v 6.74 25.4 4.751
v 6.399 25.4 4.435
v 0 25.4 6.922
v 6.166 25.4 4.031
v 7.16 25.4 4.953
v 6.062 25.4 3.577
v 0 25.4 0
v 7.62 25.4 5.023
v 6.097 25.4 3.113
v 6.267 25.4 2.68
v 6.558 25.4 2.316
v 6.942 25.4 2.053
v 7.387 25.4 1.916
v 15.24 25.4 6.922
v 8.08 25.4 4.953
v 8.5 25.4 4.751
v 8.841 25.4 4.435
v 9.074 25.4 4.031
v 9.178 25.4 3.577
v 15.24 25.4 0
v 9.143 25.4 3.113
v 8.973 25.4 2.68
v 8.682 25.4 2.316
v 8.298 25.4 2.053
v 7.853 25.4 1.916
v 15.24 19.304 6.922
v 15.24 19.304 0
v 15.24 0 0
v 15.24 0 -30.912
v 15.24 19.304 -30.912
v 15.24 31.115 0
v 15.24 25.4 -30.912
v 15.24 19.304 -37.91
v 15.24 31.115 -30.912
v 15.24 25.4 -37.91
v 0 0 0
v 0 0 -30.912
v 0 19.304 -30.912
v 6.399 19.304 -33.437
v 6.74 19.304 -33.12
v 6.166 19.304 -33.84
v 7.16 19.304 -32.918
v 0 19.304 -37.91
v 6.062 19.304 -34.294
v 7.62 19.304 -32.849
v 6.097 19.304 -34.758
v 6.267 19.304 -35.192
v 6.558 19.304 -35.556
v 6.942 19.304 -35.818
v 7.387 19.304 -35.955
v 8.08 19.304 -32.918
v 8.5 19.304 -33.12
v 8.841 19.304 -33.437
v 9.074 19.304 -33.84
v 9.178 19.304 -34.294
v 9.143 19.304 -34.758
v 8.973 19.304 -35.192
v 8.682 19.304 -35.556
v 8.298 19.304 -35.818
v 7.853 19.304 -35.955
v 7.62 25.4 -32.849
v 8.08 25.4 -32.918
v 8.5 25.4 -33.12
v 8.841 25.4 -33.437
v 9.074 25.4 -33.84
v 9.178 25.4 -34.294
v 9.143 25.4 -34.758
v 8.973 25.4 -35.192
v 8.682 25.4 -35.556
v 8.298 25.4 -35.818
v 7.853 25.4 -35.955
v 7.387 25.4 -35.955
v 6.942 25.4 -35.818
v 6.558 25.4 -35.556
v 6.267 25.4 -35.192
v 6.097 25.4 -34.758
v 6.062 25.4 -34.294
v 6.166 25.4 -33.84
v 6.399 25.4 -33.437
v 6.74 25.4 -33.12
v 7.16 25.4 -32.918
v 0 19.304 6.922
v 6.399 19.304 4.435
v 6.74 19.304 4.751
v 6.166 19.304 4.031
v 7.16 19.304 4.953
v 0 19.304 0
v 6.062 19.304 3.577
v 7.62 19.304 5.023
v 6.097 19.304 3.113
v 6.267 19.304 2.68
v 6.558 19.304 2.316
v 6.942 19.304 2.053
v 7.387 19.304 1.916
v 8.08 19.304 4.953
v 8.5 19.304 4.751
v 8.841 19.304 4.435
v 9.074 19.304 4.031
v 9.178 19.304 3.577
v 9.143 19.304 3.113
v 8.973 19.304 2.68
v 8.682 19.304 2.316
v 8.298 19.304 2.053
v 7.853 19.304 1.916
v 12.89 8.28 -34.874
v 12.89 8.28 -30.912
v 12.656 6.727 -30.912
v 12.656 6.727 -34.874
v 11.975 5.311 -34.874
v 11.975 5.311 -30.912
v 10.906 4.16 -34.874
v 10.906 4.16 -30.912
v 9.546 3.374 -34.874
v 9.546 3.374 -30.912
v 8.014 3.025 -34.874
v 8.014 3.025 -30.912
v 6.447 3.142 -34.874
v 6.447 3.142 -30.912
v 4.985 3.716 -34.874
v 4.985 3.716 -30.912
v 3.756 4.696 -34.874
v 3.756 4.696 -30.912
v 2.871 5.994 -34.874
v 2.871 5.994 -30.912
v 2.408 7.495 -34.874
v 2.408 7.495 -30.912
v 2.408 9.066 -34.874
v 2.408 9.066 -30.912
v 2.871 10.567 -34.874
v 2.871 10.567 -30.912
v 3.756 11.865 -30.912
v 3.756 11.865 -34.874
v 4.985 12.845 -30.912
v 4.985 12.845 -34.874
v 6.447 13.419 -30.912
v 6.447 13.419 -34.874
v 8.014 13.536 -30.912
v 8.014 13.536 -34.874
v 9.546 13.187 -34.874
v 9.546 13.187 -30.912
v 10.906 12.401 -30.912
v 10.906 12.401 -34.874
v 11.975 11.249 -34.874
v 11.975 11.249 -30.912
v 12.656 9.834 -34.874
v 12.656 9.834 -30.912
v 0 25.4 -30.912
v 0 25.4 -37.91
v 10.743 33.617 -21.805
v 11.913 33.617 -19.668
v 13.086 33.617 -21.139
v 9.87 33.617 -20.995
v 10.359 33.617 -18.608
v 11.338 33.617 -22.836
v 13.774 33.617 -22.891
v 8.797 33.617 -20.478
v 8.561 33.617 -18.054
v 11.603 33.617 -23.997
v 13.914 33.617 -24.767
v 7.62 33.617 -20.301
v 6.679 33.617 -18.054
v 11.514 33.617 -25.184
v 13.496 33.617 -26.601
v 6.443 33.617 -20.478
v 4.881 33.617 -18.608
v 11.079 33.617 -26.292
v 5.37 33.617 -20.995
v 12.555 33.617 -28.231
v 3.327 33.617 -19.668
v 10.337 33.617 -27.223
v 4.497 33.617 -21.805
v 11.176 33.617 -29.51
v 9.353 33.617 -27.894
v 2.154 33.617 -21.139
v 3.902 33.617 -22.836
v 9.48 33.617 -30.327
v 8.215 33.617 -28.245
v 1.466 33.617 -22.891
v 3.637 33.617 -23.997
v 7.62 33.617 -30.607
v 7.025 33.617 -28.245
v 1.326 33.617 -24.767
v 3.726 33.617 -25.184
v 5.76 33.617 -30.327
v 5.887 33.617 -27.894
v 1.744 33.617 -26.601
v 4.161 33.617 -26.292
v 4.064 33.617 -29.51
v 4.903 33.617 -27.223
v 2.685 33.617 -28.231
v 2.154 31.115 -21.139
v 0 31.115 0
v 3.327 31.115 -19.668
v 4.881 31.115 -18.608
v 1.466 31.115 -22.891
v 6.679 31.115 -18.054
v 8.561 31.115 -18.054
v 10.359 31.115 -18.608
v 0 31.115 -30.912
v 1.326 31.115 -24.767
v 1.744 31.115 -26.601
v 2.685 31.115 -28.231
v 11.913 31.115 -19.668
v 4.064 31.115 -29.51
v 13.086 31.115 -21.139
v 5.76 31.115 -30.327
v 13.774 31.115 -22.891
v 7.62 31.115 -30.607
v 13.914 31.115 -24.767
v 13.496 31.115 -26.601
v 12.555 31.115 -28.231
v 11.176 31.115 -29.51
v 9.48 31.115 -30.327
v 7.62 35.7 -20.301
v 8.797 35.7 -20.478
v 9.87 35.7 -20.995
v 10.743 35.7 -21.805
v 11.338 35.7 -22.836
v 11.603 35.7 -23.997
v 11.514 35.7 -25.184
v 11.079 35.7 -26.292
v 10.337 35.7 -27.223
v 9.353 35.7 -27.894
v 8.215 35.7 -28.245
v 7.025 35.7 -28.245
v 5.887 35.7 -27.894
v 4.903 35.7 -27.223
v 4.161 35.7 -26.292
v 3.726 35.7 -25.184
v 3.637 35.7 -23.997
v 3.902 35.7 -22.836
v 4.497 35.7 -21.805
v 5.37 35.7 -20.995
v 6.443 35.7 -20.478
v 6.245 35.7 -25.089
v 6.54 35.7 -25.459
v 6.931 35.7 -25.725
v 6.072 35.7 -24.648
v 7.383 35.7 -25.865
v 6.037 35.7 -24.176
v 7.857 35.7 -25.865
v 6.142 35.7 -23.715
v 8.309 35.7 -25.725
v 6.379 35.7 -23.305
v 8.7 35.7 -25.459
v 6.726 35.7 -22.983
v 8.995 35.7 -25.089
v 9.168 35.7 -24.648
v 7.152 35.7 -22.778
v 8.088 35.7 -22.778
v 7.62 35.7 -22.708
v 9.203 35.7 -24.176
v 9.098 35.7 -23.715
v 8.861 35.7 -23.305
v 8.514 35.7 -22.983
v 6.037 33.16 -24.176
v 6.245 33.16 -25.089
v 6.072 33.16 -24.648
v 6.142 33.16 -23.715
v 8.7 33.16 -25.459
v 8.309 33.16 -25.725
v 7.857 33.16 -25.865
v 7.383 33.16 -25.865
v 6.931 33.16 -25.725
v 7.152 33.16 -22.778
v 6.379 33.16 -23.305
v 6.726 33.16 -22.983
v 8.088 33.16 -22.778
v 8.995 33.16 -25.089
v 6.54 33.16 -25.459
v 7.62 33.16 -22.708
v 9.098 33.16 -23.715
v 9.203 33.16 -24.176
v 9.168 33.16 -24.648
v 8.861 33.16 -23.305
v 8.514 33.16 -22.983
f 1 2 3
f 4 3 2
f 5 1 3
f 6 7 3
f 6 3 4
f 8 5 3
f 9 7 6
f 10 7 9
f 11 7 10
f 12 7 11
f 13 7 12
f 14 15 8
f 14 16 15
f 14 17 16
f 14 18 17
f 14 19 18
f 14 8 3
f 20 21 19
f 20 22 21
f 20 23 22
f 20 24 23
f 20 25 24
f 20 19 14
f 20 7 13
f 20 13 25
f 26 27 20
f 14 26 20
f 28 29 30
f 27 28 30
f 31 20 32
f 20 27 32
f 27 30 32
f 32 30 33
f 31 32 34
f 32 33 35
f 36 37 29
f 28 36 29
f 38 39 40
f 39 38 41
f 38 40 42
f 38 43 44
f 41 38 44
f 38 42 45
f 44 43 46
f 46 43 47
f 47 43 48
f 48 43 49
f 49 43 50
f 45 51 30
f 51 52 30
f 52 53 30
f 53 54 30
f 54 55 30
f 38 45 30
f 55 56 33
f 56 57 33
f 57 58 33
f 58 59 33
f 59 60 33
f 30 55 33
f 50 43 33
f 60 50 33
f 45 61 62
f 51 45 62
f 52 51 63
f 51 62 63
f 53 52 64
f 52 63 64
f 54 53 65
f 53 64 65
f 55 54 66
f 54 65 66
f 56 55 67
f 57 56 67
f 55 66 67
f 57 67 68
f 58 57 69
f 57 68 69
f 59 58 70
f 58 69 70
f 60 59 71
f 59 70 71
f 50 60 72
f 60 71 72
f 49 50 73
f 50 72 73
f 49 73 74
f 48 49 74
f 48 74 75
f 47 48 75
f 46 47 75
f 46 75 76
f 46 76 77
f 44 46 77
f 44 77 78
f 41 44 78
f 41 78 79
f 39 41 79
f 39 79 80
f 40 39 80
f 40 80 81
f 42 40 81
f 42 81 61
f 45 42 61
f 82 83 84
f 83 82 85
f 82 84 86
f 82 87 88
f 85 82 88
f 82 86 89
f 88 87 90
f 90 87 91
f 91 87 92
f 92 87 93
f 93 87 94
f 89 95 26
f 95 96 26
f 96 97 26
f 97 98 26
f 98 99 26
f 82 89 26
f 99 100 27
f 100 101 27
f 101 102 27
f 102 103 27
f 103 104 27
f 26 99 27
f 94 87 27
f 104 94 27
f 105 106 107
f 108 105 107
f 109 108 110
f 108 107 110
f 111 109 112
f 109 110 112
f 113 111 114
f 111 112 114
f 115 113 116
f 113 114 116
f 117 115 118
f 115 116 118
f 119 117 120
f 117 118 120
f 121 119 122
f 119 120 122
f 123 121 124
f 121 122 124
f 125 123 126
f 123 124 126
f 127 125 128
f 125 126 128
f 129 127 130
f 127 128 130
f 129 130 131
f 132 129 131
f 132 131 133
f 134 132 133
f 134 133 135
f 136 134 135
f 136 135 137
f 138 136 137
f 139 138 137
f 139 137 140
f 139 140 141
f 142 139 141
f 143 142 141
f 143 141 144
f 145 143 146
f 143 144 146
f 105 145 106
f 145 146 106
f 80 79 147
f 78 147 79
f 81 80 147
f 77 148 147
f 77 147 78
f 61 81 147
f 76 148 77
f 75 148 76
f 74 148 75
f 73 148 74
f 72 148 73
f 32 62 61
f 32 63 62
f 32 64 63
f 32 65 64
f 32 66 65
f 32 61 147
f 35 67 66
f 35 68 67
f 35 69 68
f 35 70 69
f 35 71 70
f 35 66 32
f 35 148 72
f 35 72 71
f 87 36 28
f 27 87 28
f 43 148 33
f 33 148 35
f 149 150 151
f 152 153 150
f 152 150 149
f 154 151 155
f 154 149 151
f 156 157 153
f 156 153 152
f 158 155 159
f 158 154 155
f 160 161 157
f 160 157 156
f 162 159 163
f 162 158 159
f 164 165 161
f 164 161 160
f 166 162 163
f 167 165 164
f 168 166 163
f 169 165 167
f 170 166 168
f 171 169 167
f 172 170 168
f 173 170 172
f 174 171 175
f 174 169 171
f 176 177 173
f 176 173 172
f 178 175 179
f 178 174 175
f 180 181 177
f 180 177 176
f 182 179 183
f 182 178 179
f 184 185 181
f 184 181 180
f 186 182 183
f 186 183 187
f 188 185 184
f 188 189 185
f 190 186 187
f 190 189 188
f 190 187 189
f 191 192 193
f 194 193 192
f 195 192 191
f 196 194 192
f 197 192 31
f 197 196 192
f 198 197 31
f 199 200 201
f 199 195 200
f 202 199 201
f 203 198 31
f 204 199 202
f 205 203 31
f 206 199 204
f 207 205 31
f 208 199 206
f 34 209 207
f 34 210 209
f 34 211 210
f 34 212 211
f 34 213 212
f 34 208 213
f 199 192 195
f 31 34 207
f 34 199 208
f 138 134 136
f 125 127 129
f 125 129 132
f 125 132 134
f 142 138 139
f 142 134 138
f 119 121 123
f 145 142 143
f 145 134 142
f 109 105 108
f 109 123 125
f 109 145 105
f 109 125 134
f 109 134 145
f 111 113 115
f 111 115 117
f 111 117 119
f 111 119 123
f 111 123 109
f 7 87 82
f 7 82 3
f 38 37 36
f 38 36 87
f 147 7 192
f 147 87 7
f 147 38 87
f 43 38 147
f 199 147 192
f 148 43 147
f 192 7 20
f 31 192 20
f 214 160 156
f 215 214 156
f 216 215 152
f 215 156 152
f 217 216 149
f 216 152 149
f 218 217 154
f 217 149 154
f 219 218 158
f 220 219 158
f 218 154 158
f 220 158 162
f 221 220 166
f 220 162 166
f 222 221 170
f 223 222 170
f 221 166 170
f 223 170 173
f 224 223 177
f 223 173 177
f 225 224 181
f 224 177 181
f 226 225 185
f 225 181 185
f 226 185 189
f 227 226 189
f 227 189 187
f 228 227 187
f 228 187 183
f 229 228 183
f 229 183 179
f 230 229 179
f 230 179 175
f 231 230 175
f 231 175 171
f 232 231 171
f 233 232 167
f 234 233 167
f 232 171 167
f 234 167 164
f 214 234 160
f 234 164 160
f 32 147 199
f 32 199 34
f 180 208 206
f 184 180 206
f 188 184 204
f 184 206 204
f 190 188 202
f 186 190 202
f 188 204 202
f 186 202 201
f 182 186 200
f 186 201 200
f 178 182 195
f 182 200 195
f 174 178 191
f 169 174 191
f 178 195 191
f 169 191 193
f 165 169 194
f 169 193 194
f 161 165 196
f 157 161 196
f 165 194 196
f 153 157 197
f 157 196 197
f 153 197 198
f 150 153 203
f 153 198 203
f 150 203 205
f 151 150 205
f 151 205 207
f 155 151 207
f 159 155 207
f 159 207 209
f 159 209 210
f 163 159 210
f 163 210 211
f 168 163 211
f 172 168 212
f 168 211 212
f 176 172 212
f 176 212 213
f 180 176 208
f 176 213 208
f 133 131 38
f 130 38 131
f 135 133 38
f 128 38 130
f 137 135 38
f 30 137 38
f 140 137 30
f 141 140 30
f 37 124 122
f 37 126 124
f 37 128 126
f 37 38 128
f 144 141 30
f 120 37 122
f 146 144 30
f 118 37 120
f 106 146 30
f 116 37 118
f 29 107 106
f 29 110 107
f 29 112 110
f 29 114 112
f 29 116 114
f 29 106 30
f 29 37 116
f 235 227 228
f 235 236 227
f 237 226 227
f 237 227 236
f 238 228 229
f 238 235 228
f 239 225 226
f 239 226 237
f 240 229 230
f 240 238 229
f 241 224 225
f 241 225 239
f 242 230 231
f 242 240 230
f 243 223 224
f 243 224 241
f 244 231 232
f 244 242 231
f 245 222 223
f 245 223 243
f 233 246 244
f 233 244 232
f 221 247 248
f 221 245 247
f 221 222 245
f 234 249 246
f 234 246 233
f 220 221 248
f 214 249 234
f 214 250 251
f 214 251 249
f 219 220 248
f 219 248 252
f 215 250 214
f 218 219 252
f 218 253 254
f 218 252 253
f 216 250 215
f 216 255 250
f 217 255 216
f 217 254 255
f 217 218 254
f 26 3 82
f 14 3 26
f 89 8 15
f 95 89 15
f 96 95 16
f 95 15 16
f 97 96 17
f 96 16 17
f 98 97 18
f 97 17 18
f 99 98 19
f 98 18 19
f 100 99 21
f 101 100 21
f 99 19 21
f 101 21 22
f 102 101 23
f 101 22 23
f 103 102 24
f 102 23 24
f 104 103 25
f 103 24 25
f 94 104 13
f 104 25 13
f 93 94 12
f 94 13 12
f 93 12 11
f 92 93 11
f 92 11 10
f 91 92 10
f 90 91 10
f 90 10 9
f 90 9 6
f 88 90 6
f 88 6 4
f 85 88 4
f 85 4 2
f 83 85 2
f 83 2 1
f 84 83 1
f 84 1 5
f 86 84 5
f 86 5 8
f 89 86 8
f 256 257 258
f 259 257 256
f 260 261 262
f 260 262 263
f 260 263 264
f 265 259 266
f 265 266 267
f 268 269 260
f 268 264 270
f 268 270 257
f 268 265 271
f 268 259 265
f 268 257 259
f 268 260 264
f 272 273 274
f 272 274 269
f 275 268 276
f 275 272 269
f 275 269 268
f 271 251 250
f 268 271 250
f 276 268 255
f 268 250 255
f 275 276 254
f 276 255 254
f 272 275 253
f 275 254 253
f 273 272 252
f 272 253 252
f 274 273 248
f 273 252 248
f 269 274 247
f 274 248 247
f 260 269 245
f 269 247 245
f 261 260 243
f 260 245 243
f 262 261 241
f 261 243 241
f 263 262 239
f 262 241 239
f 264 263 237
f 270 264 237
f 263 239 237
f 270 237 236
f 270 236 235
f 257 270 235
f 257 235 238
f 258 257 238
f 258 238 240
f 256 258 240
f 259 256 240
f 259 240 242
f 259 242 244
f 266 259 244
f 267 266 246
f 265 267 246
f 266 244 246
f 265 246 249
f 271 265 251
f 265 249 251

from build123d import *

# Parameters (mm, degrees)
SKETCH1_W                = 15.24
SKETCH1_H                = 30.9118
BOSS_EXTRUDE1_DEPTH      = 31.115
BOSS_EXTRUDE2_DEPTH      = 6.9215
BOSS_EXTRUDE2_DEPTH_BACK = 37.9095
SKETCH2_W                = 15.24
SKETCH2_H                = 6.096
SKETCH3_R                = 5.2705
BOSS_EXTRUDE3_DEPTH      = 3.9624
SKETCH4_R                = 6.3119
BOSS_EXTRUDE4_DEPTH      = 2.5019
CUT_EXTRUDE1_REACH       = 50.11
SKETCH8_R                = 1.5621
CUT_EXTRUDE2_REACH       = 50.11
SKETCH9_R                = 1.5621
SKETCH10_R               = 3.99415
BOSS_EXTRUDE5_DEPTH      = 2.0828
SKETCH13_R               = 1.5875
CUT_EXTRUDE3_DEPTH       = 2.54


with BuildPart() as part:
    # Sketch1 → Boss-Extrude1 (new body)
    with BuildSketch(Plane(origin=(0, 0, 0), x_dir=(1, 0, 0), z_dir=(0, 1, 0))):
        with Locations((7.62, 15.4559)):
            Rectangle(SKETCH1_W, SKETCH1_H)
    extrude(amount=BOSS_EXTRUDE1_DEPTH)

    # Sketch2 → Boss-Extrude2 (add, two sides: drawn at the far end of the back side and taken through both)
    with BuildSketch(Plane.XY.offset(-BOSS_EXTRUDE2_DEPTH_BACK)):
        with Locations((7.62, 22.352)):
            Rectangle(SKETCH2_W, SKETCH2_H)
    extrude(amount=BOSS_EXTRUDE2_DEPTH + BOSS_EXTRUDE2_DEPTH_BACK)

    # Sketch3 → Boss-Extrude3 (add)
    with BuildSketch(Plane(origin=(0, 0, -30.9118), x_dir=(-1, 0, 0), z_dir=(0, 0, -1))):
        with Locations(Location((-7.62, 8.2804, 0), (0, 0, 180))):
            Circle(SKETCH3_R)
    extrude(amount=BOSS_EXTRUDE3_DEPTH)

    # Sketch4 → Boss-Extrude4 (add)
    with BuildSketch(Plane(origin=(0, 31.115, 0), x_dir=(1, 0, 0), z_dir=(0, 1, 0))):
        with Locations(Location((7.62, 24.2951, 0), (0, 0, 90))):
            Circle(SKETCH4_R)
    extrude(amount=BOSS_EXTRUDE4_DEPTH)

    # Sketch8 → Cut-Extrude1 (cut, up to next)
    with BuildSketch(Plane(origin=(0, 25.4, 0), x_dir=(1, 0, 0), z_dir=(0, 1, 0)), mode=Mode.PRIVATE) as cut_extrude1_sk1:
        with Locations(Location((7.62, -3.46075, 0), (0, 0, 270))):
            Circle(SKETCH8_R)
    cut_extrude1_tool1 = extrude(cut_extrude1_sk1.sketch, amount=-CUT_EXTRUDE1_REACH, mode=Mode.PRIVATE) & part.part
    add(cut_extrude1_tool1.solids().sort_by_distance((7.62, 25.4, 3.46075))[0], mode=Mode.SUBTRACT)

    # Sketch9 → Cut-Extrude2 (cut, up to next)
    with BuildSketch(Plane(origin=(0, 25.4, 0), x_dir=(1, 0, 0), z_dir=(0, 1, 0)), mode=Mode.PRIVATE) as cut_extrude2_sk1:
        with Locations(Location((7.62, 34.41065, 0), (0, 0, 270))):
            Circle(SKETCH9_R)
    cut_extrude2_tool1 = extrude(cut_extrude2_sk1.sketch, amount=-CUT_EXTRUDE2_REACH, mode=Mode.PRIVATE) & part.part
    add(cut_extrude2_tool1.solids().sort_by_distance((7.62, 25.4, -34.41065))[0], mode=Mode.SUBTRACT)

    # Sketch10 → Boss-Extrude5 (add)
    with BuildSketch(Plane(origin=(0, 33.6169, 0), x_dir=(1, 0, 0), z_dir=(0, 1, 0))):
        with Locations(Location((7.62, 24.2951, 0), (0, 0, 270))):
            Circle(SKETCH10_R)
    extrude(amount=BOSS_EXTRUDE5_DEPTH)

    # Sketch13 → Cut-Extrude3 (cut)
    with BuildSketch(Plane(origin=(0, 35.6997, 0), x_dir=(1, 0, 0), z_dir=(0, 1, 0))):
        with Locations(Location((7.62, 24.2951, 0), (0, 0, 270))):
            Circle(SKETCH13_R)
    extrude(amount=-CUT_EXTRUDE3_DEPTH, mode=Mode.SUBTRACT)


solid = part.part
